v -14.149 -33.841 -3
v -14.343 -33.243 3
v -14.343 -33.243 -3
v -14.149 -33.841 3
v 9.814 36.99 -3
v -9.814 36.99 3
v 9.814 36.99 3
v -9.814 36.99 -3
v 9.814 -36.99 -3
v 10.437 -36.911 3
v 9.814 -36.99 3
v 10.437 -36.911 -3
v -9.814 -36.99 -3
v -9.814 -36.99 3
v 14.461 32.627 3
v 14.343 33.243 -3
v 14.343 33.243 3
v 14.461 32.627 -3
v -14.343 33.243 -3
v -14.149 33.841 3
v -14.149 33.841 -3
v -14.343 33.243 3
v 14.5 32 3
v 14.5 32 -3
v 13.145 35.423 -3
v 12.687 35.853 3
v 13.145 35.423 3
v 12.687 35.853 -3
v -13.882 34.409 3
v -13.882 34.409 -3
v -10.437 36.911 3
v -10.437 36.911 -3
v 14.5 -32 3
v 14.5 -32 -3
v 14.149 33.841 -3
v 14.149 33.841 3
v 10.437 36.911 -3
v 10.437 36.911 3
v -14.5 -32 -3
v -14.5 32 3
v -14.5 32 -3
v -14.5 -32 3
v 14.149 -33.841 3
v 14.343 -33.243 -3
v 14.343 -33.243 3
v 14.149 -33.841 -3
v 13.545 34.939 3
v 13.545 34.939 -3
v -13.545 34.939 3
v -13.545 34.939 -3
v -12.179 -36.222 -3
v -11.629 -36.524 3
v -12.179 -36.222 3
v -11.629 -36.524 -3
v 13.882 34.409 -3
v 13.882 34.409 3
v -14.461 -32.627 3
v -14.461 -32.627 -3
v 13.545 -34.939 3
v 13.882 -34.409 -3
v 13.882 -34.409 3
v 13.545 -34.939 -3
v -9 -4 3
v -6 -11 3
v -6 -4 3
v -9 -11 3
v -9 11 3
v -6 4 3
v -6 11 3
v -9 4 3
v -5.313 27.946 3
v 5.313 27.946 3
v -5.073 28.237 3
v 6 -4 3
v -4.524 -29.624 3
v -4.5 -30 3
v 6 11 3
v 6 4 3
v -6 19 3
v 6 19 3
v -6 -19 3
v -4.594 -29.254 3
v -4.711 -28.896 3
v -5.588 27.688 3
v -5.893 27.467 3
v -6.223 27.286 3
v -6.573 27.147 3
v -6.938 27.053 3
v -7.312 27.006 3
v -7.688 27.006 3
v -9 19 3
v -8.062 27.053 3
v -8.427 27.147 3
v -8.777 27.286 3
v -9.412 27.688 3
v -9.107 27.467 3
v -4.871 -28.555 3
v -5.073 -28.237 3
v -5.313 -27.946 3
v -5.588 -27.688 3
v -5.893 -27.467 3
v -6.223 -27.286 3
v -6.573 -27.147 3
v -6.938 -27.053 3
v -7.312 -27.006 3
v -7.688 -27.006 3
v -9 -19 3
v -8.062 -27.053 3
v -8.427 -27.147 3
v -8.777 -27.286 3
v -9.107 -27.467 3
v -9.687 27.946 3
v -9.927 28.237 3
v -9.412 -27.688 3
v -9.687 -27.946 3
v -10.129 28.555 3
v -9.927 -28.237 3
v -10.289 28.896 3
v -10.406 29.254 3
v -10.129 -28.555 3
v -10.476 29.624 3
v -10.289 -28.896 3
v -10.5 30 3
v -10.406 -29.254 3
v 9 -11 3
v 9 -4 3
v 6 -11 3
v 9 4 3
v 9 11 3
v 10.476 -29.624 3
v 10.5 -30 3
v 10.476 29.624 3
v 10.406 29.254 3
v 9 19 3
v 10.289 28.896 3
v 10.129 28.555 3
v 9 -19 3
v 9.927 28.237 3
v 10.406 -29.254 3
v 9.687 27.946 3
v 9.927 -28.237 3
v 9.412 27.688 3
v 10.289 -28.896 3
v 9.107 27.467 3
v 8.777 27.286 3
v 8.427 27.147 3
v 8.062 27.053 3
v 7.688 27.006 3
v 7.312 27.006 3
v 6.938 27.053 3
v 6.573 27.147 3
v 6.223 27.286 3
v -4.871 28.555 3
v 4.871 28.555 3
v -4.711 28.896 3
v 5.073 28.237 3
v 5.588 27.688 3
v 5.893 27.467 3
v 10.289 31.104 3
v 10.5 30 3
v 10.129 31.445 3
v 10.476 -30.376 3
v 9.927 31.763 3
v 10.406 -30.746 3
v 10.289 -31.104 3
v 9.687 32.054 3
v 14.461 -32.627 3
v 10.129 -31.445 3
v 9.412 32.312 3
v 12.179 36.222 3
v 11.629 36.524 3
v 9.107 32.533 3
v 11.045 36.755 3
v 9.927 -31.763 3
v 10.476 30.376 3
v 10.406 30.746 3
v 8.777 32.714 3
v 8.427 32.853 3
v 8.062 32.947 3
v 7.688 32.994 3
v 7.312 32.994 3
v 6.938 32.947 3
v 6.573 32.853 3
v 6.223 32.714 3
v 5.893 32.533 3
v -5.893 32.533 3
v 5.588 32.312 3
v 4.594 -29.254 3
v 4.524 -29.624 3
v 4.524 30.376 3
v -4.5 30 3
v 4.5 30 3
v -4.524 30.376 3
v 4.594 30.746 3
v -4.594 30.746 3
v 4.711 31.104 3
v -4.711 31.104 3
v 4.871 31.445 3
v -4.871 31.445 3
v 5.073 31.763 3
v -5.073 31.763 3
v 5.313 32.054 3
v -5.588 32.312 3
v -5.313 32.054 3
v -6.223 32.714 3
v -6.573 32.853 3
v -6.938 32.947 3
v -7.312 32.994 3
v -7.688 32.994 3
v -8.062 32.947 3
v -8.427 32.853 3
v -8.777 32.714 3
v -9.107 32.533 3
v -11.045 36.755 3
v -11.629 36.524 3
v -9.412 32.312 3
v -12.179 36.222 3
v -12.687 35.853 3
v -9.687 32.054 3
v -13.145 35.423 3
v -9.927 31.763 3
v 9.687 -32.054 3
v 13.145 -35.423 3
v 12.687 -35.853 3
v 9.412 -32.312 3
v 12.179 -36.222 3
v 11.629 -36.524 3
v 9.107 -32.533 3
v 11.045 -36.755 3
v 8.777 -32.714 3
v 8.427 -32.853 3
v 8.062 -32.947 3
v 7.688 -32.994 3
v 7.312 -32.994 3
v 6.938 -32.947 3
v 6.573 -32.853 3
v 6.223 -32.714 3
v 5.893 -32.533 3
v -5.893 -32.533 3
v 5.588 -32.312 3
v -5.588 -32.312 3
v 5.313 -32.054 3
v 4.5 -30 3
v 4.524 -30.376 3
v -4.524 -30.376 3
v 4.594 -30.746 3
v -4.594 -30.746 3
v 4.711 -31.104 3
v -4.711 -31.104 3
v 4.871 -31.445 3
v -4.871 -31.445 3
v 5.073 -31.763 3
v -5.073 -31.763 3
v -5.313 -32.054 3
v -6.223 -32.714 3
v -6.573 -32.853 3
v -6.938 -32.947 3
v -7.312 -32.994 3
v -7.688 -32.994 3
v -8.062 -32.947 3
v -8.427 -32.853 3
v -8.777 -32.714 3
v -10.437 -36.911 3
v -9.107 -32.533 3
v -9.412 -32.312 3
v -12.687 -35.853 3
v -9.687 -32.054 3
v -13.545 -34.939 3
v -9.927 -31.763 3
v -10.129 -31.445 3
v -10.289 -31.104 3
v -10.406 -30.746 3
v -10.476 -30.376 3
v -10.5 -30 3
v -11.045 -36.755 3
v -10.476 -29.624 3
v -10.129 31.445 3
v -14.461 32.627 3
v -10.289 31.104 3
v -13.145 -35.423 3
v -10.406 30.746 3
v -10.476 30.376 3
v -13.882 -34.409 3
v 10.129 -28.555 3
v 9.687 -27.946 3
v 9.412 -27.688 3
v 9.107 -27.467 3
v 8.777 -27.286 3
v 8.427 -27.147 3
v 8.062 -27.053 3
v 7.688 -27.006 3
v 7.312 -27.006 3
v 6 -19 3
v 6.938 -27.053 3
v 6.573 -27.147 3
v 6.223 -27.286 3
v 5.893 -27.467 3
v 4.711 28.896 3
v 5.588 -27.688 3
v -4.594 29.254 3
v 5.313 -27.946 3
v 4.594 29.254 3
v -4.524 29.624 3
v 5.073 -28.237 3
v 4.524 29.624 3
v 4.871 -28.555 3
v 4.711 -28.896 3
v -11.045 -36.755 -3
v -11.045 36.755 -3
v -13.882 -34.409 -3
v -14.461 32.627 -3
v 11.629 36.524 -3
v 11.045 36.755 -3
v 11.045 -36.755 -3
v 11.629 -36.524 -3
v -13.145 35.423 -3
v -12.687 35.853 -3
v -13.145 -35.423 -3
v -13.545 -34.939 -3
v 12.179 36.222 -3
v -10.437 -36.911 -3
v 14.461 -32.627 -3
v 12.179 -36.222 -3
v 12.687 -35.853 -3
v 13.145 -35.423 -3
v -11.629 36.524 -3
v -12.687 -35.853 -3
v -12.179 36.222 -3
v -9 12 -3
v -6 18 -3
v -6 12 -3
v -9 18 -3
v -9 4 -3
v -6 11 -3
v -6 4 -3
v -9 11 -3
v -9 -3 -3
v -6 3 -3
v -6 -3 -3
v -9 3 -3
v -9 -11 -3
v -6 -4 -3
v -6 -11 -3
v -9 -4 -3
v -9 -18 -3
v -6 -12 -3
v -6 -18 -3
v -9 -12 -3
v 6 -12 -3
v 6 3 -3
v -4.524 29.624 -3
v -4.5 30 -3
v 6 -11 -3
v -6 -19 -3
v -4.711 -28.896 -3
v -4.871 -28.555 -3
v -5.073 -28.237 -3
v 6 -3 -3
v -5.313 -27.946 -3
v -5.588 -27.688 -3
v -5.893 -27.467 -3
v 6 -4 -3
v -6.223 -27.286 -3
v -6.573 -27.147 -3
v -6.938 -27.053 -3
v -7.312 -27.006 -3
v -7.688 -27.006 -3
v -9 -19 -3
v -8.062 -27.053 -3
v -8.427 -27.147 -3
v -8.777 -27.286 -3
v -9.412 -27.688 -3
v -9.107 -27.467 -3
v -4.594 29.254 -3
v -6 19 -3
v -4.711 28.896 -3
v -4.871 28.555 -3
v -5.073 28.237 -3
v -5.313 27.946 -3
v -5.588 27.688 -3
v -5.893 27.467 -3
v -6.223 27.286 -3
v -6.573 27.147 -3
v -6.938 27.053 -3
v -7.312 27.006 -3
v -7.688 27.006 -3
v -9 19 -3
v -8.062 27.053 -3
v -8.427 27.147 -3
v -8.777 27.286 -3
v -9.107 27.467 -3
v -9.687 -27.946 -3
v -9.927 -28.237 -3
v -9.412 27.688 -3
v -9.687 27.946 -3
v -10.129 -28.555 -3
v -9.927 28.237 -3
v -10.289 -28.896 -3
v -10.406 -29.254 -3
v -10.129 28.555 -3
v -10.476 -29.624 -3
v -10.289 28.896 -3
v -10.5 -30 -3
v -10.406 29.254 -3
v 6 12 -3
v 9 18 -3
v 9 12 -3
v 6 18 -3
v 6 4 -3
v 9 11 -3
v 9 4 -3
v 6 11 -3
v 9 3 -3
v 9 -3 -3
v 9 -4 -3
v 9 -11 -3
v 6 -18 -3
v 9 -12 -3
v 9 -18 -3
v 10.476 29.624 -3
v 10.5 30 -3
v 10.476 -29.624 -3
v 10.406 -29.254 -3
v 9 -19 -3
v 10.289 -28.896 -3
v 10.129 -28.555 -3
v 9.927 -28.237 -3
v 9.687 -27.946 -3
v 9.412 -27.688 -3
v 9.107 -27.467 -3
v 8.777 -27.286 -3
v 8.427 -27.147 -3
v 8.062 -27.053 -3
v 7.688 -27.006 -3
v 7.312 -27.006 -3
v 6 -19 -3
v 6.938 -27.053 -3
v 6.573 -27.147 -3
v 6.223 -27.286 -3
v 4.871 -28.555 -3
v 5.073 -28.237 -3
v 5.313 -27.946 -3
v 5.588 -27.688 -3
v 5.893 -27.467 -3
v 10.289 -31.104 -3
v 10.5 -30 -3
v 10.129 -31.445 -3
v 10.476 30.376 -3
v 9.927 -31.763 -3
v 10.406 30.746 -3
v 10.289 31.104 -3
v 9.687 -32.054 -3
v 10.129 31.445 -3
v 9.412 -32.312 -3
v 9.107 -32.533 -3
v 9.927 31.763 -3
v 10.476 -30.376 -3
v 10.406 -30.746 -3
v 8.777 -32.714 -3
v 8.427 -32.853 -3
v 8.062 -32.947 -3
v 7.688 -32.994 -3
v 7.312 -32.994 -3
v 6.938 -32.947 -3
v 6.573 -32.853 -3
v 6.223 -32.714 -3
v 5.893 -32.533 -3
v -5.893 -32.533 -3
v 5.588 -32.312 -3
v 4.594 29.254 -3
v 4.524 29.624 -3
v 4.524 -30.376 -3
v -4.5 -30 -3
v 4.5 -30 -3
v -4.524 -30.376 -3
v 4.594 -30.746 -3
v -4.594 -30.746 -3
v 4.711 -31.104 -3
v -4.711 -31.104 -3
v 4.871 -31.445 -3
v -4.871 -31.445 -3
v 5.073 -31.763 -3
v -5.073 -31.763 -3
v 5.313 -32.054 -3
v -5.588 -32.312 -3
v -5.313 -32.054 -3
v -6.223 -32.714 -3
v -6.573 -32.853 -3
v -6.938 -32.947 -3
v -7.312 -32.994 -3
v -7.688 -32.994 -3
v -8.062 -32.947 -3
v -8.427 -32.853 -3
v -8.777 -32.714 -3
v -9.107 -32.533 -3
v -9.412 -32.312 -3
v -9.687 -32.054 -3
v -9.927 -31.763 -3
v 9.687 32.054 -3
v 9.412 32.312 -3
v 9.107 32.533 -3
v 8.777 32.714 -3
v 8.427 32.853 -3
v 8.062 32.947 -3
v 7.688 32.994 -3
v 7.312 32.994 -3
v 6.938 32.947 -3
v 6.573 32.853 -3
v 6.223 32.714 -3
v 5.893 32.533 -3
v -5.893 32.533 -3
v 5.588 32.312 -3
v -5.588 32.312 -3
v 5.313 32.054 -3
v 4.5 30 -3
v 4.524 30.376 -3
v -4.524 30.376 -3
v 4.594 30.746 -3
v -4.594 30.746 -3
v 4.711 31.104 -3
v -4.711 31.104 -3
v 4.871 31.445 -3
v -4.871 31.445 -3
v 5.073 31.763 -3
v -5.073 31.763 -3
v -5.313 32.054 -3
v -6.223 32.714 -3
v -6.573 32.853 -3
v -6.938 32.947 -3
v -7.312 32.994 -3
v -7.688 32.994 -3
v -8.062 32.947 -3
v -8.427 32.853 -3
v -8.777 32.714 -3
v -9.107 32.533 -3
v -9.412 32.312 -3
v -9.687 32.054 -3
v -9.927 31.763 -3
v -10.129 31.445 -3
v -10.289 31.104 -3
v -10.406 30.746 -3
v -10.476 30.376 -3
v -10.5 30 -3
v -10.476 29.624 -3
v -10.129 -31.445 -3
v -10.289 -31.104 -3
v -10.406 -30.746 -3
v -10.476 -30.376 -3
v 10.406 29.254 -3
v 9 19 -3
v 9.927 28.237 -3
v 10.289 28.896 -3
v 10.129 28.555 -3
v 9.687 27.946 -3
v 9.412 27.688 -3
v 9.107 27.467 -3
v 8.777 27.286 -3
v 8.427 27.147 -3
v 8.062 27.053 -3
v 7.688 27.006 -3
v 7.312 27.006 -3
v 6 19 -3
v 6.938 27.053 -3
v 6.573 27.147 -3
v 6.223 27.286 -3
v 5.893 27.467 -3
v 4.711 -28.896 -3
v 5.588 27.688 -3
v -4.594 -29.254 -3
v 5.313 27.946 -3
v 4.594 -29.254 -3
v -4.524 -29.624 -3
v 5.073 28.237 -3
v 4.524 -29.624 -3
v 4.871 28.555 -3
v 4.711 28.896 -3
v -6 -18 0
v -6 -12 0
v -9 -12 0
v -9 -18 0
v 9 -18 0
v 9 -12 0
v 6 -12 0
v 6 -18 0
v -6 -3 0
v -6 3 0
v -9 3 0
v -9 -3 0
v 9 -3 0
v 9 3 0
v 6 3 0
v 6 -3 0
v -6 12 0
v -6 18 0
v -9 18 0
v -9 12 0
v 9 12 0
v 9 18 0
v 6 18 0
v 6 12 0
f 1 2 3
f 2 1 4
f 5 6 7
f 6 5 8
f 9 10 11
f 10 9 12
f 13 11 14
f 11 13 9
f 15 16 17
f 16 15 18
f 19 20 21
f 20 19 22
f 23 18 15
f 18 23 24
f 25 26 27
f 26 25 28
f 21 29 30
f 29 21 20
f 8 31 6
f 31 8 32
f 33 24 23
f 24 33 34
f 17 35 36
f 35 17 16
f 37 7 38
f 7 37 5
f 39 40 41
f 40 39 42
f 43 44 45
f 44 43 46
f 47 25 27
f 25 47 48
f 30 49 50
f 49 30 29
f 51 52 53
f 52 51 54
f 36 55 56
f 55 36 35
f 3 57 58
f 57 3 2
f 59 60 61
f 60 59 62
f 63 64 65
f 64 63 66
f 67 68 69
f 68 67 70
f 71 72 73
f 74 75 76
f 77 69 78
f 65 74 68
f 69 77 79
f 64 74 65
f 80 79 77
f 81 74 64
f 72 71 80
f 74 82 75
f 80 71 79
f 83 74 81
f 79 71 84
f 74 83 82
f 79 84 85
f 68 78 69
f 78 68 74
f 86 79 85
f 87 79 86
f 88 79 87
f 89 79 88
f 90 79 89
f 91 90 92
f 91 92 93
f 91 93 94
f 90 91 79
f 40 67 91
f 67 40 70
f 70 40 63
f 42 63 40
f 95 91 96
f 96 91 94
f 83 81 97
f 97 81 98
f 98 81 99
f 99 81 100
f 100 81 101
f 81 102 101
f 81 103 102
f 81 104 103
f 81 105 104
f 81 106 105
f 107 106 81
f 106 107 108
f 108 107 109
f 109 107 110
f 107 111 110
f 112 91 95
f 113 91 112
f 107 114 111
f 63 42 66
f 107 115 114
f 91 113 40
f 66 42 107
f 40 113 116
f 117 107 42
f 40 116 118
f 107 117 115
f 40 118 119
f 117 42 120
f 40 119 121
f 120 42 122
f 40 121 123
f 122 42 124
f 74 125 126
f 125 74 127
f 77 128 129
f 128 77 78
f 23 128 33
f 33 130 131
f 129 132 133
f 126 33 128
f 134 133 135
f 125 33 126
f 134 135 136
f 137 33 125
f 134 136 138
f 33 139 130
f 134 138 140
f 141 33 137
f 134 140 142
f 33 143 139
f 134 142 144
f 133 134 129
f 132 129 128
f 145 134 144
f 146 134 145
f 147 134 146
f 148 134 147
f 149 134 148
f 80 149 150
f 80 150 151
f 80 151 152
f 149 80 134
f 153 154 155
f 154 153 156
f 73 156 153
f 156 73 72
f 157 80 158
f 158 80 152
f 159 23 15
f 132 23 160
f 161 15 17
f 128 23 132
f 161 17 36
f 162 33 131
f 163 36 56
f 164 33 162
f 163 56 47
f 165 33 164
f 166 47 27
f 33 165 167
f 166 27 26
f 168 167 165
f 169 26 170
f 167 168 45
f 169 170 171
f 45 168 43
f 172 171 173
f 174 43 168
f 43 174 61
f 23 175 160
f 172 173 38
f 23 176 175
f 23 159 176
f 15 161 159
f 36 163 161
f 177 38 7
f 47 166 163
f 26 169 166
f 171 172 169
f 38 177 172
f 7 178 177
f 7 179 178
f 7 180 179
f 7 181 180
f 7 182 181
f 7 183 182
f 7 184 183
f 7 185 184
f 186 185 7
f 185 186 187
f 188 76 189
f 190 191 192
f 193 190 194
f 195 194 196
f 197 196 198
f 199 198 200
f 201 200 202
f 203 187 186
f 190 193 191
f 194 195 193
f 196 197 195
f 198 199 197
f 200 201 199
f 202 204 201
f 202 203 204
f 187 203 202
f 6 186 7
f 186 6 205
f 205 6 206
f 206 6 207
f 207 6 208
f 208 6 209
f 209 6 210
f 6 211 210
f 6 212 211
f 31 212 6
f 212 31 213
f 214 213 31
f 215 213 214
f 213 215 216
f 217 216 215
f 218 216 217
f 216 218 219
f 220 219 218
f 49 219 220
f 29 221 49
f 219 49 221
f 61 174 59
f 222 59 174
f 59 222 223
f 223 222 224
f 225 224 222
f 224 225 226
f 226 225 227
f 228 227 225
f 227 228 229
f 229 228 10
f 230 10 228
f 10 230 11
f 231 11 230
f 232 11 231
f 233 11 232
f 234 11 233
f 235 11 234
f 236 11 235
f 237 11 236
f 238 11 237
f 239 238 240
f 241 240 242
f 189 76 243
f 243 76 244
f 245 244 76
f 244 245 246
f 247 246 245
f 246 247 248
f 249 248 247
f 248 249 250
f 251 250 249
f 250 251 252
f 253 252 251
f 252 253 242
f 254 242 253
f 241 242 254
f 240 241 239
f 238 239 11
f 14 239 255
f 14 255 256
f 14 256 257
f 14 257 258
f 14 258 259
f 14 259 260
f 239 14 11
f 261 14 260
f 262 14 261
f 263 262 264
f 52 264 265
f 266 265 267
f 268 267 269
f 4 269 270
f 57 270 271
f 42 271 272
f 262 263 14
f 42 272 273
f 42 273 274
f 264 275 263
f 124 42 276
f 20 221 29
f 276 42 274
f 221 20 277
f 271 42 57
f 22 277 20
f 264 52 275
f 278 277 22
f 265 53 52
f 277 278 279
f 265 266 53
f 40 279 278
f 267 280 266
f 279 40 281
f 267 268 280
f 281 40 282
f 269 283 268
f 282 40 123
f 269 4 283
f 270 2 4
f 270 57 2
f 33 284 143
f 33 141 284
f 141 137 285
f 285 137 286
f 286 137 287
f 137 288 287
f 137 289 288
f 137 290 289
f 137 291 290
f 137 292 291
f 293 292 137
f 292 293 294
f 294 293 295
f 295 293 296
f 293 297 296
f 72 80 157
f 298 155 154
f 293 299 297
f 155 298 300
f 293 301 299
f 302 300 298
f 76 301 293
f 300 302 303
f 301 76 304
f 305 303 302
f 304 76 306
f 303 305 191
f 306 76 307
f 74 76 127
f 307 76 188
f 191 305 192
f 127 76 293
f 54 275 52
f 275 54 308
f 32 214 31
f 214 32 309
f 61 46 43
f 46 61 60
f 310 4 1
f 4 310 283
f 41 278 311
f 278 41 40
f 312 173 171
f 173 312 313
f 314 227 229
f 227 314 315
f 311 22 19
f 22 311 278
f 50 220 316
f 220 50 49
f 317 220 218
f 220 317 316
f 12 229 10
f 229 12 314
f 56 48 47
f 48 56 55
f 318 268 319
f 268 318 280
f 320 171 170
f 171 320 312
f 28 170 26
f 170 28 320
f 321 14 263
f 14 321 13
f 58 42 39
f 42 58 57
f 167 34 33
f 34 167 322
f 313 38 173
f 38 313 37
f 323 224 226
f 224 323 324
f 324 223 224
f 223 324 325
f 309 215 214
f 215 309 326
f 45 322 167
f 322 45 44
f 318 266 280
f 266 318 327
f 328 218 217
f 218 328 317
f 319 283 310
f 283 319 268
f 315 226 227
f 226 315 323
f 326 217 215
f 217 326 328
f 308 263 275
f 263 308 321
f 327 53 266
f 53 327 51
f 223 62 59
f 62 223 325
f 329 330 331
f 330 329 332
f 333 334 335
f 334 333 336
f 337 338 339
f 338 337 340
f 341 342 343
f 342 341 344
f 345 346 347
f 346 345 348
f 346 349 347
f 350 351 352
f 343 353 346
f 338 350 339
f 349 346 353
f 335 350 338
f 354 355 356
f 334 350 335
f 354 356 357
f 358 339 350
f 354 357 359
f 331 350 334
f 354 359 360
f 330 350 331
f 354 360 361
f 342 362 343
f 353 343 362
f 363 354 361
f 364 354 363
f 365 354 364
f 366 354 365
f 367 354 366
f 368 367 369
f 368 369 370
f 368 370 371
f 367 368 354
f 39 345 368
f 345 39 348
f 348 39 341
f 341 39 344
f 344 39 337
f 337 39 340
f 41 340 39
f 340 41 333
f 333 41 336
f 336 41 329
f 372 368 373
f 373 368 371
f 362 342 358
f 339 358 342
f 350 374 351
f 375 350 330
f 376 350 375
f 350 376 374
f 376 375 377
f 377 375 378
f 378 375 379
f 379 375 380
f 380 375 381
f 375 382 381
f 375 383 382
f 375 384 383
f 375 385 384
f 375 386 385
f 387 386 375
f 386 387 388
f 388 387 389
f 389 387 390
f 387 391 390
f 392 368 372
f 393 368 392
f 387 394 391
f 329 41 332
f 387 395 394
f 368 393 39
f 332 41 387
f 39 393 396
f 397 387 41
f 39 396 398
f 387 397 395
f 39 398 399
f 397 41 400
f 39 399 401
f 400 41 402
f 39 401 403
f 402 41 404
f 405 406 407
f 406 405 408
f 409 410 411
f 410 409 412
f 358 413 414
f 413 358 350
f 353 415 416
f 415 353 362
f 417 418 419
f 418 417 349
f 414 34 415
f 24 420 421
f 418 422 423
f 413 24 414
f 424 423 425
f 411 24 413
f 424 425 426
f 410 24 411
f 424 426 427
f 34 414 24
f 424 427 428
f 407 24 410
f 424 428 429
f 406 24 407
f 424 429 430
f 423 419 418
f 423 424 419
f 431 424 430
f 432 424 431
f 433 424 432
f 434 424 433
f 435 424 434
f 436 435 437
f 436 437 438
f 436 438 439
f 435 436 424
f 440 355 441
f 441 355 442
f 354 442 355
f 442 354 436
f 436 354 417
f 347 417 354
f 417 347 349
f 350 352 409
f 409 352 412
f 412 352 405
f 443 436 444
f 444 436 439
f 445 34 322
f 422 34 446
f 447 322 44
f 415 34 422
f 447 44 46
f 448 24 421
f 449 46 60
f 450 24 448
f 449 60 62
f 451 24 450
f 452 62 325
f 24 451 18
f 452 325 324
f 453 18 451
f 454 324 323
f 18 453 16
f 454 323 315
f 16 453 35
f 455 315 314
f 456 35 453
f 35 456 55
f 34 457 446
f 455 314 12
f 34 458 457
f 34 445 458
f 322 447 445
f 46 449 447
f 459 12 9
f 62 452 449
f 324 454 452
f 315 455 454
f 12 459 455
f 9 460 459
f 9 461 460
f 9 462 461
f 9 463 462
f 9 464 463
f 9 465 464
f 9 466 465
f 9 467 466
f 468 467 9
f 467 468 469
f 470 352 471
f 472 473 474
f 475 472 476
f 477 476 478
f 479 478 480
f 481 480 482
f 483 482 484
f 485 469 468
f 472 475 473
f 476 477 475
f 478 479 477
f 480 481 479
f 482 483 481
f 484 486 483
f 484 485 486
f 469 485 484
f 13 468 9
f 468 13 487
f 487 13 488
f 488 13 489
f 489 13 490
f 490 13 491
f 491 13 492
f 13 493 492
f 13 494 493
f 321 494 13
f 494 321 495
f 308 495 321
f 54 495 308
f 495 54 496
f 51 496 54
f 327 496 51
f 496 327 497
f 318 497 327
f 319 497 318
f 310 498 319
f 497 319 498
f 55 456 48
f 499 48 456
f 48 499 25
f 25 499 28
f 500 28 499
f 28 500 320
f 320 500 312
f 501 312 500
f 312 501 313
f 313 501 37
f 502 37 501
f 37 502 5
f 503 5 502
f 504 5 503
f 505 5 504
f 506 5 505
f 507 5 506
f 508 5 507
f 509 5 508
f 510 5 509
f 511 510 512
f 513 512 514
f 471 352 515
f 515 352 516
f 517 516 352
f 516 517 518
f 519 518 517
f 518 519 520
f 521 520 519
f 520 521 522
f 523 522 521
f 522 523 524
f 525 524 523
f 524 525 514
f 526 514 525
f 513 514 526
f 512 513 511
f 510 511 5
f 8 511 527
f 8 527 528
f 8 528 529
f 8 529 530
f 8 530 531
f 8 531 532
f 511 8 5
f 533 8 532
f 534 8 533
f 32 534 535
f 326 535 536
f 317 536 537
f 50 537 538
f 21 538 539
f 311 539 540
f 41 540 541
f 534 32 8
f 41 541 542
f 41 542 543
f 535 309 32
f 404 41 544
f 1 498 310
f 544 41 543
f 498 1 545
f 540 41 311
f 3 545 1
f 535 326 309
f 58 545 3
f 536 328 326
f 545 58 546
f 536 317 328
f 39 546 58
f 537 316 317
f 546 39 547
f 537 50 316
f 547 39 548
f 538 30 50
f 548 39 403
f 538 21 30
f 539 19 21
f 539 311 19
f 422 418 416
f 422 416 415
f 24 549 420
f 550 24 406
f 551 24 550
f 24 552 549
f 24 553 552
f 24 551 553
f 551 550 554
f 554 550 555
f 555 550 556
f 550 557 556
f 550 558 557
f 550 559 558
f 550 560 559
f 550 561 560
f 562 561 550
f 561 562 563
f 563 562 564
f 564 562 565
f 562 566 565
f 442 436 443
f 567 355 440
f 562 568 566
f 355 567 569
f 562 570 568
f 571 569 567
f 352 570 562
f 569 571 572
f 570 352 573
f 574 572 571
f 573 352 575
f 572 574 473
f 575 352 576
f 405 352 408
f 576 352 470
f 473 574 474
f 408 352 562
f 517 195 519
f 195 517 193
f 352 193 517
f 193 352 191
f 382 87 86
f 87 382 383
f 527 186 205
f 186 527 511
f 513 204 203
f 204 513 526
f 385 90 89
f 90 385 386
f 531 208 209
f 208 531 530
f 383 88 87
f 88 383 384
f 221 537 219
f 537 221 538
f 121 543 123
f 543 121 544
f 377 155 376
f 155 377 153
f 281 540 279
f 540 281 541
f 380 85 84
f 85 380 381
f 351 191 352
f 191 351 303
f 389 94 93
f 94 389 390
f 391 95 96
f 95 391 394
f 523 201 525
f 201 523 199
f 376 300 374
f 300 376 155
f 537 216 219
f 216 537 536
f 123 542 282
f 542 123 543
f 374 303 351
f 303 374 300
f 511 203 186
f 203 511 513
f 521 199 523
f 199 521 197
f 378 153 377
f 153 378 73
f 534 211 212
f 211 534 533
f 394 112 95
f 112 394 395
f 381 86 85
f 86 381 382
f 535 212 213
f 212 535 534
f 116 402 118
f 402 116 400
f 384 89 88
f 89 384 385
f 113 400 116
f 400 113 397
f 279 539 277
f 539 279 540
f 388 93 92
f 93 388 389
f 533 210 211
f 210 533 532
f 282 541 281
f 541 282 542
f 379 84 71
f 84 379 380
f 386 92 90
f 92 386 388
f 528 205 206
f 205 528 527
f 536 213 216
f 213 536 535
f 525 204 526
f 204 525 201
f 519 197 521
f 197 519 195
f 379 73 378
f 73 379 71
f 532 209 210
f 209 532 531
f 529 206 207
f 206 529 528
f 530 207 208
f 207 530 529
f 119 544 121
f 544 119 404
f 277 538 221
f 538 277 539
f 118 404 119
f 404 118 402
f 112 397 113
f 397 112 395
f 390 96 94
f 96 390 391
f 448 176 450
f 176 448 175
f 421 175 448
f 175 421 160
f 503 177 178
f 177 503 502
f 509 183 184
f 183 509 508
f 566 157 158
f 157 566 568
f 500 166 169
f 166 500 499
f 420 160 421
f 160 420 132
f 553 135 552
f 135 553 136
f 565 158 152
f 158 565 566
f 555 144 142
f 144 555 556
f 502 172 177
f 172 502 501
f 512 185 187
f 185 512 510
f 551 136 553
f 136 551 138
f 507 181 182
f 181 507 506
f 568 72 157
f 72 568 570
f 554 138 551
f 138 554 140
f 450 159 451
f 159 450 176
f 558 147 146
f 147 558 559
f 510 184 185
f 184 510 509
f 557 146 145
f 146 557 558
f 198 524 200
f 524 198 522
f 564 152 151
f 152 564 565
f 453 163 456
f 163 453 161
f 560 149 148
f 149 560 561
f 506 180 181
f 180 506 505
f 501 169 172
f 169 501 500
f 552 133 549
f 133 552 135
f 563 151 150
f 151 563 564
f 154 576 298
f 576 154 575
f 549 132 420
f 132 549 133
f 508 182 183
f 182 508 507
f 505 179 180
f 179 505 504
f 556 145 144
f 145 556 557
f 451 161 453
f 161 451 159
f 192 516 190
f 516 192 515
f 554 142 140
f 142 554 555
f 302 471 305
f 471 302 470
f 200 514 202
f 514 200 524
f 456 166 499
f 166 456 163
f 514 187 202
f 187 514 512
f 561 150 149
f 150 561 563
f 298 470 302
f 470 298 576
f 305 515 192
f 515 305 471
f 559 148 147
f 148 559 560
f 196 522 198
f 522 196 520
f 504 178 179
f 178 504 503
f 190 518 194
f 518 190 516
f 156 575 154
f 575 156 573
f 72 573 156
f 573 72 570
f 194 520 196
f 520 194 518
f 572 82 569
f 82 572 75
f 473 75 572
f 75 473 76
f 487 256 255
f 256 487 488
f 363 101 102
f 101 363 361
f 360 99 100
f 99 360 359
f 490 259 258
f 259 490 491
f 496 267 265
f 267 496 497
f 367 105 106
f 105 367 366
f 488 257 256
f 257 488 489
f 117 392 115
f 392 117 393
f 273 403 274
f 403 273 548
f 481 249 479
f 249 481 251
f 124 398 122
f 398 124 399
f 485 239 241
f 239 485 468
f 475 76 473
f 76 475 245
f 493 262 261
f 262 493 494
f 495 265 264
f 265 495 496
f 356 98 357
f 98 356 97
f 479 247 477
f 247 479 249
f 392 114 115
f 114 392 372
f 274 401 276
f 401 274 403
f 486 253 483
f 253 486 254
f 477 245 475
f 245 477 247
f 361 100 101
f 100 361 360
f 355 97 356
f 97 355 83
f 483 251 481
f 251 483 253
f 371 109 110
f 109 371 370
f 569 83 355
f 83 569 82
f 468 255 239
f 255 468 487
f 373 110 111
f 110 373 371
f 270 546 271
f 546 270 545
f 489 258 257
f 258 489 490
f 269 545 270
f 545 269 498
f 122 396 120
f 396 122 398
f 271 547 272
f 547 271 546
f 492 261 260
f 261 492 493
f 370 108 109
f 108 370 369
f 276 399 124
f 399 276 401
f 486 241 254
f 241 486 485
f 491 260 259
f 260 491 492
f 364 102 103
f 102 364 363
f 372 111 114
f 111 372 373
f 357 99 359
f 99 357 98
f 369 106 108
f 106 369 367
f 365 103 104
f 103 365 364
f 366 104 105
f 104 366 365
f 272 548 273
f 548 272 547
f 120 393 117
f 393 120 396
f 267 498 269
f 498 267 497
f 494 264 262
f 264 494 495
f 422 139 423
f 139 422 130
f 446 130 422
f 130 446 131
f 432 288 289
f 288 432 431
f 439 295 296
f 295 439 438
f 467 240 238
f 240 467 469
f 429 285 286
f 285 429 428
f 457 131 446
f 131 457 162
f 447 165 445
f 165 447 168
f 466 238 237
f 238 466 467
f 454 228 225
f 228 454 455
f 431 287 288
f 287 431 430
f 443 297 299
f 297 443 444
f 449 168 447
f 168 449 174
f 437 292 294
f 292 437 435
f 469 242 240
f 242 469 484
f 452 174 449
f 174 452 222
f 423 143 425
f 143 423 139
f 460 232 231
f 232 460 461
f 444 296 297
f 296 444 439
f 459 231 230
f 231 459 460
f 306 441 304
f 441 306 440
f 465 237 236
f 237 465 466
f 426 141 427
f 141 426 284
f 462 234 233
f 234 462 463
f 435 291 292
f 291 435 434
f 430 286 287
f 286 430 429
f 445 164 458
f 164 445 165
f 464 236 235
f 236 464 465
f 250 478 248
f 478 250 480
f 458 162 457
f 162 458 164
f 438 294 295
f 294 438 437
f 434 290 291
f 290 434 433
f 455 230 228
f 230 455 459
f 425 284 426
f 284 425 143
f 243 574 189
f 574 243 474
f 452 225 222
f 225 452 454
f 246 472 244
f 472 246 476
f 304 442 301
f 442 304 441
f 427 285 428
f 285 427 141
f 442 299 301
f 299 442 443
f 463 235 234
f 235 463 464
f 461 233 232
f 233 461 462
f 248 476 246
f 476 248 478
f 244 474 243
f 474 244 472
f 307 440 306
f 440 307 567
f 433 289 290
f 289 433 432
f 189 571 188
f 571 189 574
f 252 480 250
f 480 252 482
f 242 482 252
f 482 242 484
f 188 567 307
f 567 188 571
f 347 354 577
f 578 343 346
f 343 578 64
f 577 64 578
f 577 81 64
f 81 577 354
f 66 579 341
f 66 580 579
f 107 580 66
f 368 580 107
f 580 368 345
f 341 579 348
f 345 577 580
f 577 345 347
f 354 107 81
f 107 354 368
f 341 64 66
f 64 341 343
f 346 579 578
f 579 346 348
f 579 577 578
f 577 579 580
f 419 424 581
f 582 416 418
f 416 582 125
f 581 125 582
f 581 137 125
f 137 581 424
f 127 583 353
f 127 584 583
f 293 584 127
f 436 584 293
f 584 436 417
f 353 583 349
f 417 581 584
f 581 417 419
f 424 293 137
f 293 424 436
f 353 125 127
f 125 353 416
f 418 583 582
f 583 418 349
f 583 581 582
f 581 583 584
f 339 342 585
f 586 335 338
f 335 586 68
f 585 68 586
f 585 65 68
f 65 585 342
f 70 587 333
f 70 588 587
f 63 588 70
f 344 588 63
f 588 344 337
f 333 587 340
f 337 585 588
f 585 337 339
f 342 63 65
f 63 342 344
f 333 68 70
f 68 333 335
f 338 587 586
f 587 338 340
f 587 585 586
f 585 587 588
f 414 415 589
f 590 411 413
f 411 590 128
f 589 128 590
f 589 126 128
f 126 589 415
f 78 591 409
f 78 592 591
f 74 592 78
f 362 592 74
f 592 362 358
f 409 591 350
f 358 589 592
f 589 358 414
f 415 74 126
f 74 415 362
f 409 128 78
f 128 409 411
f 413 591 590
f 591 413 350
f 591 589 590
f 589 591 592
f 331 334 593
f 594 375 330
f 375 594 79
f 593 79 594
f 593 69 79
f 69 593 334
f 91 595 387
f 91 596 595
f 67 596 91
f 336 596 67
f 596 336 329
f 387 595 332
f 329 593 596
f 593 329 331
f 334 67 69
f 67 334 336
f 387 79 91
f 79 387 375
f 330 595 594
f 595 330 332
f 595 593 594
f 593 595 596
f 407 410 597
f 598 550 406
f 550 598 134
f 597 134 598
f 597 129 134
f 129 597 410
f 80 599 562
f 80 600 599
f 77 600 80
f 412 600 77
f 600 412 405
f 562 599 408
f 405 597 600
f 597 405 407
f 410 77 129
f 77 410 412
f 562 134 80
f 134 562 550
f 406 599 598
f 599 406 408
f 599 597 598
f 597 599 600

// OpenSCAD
$fn = 50;


difference() {
	union() {
		translate(v = [0, 0, -3.0000000000]) {
			hull() {
				translate(v = [-9.5000000000, 32.0000000000, 0]) {
					cylinder(h = 6, r = 5);
				}
				translate(v = [9.5000000000, 32.0000000000, 0]) {
					cylinder(h = 6, r = 5);
				}
				translate(v = [-9.5000000000, -32.0000000000, 0]) {
					cylinder(h = 6, r = 5);
				}
				translate(v = [9.5000000000, -32.0000000000, 0]) {
					cylinder(h = 6, r = 5);
				}
			}
		}
		translate(v = [0, 0, -3.0000000000]) {
			hull() {
				translate(v = [-9.5000000000, 32.0000000000, 0]) {
					cylinder(h = 6, r = 5);
				}
				translate(v = [9.5000000000, 32.0000000000, 0]) {
					cylinder(h = 6, r = 5);
				}
				translate(v = [-9.5000000000, -32.0000000000, 0]) {
					cylinder(h = 6, r = 5);
				}
				translate(v = [9.5000000000, -32.0000000000, 0]) {
					cylinder(h = 6, r = 5);
				}
			}
		}
	}
	union() {
		translate(v = [-7.5000000000, 30.0000000000, -100.0000000000]) {
			cylinder(h = 200, r = 3.0000000000);
		}
		translate(v = [7.5000000000, 30.0000000000, -100.0000000000]) {
			cylinder(h = 200, r = 3.0000000000);
		}
		translate(v = [-7.5000000000, -30.0000000000, -100.0000000000]) {
			cylinder(h = 200, r = 3.0000000000);
		}
		translate(v = [7.5000000000, -30.0000000000, -100.0000000000]) {
			cylinder(h = 200, r = 3.0000000000);
		}
		translate(v = [-9.0000000000, -19.0000000000, -50]) {
			cube(size = [3, 1, 100]);
		}
		translate(v = [-9.0000000000, -12.0000000000, -50]) {
			cube(size = [3, 1, 100]);
		}
		translate(v = [-9.0000000000, -19.0000000000, 0]) {
			cube(size = [3, 8, 3]);
		}
		translate(v = [6.0000000000, -19.0000000000, -50]) {
			cube(size = [3, 1, 100]);
		}
		translate(v = [6.0000000000, -12.0000000000, -50]) {
			cube(size = [3, 1, 100]);
		}
		translate(v = [6.0000000000, -19.0000000000, 0]) {
			cube(size = [3, 8, 3]);
		}
		translate(v = [-9.0000000000, -4.0000000000, -50]) {
			cube(size = [3, 1, 100]);
		}
		translate(v = [-9.0000000000, 3.0000000000, -50]) {
			cube(size = [3, 1, 100]);
		}
		translate(v = [-9.0000000000, -4.0000000000, 0]) {
			cube(size = [3, 8, 3]);
		}
		translate(v = [6.0000000000, -4.0000000000, -50]) {
			cube(size = [3, 1, 100]);
		}
		translate(v = [6.0000000000, 3.0000000000, -50]) {
			cube(size = [3, 1, 100]);
		}
		translate(v = [6.0000000000, -4.0000000000, 0]) {
			cube(size = [3, 8, 3]);
		}
		translate(v = [-9.0000000000, 11.0000000000, -50]) {
			cube(size = [3, 1, 100]);
		}
		translate(v = [-9.0000000000, 18.0000000000, -50]) {
			cube(size = [3, 1, 100]);
		}
		translate(v = [-9.0000000000, 11.0000000000, 0]) {
			cube(size = [3, 8, 3]);
		}
		translate(v = [6.0000000000, 11.0000000000, -50]) {
			cube(size = [3, 1, 100]);
		}
		translate(v = [6.0000000000, 18.0000000000, -50]) {
			cube(size = [3, 1, 100]);
		}
		translate(v = [6.0000000000, 11.0000000000, 0]) {
			cube(size = [3, 8, 3]);
		}
	}
}
